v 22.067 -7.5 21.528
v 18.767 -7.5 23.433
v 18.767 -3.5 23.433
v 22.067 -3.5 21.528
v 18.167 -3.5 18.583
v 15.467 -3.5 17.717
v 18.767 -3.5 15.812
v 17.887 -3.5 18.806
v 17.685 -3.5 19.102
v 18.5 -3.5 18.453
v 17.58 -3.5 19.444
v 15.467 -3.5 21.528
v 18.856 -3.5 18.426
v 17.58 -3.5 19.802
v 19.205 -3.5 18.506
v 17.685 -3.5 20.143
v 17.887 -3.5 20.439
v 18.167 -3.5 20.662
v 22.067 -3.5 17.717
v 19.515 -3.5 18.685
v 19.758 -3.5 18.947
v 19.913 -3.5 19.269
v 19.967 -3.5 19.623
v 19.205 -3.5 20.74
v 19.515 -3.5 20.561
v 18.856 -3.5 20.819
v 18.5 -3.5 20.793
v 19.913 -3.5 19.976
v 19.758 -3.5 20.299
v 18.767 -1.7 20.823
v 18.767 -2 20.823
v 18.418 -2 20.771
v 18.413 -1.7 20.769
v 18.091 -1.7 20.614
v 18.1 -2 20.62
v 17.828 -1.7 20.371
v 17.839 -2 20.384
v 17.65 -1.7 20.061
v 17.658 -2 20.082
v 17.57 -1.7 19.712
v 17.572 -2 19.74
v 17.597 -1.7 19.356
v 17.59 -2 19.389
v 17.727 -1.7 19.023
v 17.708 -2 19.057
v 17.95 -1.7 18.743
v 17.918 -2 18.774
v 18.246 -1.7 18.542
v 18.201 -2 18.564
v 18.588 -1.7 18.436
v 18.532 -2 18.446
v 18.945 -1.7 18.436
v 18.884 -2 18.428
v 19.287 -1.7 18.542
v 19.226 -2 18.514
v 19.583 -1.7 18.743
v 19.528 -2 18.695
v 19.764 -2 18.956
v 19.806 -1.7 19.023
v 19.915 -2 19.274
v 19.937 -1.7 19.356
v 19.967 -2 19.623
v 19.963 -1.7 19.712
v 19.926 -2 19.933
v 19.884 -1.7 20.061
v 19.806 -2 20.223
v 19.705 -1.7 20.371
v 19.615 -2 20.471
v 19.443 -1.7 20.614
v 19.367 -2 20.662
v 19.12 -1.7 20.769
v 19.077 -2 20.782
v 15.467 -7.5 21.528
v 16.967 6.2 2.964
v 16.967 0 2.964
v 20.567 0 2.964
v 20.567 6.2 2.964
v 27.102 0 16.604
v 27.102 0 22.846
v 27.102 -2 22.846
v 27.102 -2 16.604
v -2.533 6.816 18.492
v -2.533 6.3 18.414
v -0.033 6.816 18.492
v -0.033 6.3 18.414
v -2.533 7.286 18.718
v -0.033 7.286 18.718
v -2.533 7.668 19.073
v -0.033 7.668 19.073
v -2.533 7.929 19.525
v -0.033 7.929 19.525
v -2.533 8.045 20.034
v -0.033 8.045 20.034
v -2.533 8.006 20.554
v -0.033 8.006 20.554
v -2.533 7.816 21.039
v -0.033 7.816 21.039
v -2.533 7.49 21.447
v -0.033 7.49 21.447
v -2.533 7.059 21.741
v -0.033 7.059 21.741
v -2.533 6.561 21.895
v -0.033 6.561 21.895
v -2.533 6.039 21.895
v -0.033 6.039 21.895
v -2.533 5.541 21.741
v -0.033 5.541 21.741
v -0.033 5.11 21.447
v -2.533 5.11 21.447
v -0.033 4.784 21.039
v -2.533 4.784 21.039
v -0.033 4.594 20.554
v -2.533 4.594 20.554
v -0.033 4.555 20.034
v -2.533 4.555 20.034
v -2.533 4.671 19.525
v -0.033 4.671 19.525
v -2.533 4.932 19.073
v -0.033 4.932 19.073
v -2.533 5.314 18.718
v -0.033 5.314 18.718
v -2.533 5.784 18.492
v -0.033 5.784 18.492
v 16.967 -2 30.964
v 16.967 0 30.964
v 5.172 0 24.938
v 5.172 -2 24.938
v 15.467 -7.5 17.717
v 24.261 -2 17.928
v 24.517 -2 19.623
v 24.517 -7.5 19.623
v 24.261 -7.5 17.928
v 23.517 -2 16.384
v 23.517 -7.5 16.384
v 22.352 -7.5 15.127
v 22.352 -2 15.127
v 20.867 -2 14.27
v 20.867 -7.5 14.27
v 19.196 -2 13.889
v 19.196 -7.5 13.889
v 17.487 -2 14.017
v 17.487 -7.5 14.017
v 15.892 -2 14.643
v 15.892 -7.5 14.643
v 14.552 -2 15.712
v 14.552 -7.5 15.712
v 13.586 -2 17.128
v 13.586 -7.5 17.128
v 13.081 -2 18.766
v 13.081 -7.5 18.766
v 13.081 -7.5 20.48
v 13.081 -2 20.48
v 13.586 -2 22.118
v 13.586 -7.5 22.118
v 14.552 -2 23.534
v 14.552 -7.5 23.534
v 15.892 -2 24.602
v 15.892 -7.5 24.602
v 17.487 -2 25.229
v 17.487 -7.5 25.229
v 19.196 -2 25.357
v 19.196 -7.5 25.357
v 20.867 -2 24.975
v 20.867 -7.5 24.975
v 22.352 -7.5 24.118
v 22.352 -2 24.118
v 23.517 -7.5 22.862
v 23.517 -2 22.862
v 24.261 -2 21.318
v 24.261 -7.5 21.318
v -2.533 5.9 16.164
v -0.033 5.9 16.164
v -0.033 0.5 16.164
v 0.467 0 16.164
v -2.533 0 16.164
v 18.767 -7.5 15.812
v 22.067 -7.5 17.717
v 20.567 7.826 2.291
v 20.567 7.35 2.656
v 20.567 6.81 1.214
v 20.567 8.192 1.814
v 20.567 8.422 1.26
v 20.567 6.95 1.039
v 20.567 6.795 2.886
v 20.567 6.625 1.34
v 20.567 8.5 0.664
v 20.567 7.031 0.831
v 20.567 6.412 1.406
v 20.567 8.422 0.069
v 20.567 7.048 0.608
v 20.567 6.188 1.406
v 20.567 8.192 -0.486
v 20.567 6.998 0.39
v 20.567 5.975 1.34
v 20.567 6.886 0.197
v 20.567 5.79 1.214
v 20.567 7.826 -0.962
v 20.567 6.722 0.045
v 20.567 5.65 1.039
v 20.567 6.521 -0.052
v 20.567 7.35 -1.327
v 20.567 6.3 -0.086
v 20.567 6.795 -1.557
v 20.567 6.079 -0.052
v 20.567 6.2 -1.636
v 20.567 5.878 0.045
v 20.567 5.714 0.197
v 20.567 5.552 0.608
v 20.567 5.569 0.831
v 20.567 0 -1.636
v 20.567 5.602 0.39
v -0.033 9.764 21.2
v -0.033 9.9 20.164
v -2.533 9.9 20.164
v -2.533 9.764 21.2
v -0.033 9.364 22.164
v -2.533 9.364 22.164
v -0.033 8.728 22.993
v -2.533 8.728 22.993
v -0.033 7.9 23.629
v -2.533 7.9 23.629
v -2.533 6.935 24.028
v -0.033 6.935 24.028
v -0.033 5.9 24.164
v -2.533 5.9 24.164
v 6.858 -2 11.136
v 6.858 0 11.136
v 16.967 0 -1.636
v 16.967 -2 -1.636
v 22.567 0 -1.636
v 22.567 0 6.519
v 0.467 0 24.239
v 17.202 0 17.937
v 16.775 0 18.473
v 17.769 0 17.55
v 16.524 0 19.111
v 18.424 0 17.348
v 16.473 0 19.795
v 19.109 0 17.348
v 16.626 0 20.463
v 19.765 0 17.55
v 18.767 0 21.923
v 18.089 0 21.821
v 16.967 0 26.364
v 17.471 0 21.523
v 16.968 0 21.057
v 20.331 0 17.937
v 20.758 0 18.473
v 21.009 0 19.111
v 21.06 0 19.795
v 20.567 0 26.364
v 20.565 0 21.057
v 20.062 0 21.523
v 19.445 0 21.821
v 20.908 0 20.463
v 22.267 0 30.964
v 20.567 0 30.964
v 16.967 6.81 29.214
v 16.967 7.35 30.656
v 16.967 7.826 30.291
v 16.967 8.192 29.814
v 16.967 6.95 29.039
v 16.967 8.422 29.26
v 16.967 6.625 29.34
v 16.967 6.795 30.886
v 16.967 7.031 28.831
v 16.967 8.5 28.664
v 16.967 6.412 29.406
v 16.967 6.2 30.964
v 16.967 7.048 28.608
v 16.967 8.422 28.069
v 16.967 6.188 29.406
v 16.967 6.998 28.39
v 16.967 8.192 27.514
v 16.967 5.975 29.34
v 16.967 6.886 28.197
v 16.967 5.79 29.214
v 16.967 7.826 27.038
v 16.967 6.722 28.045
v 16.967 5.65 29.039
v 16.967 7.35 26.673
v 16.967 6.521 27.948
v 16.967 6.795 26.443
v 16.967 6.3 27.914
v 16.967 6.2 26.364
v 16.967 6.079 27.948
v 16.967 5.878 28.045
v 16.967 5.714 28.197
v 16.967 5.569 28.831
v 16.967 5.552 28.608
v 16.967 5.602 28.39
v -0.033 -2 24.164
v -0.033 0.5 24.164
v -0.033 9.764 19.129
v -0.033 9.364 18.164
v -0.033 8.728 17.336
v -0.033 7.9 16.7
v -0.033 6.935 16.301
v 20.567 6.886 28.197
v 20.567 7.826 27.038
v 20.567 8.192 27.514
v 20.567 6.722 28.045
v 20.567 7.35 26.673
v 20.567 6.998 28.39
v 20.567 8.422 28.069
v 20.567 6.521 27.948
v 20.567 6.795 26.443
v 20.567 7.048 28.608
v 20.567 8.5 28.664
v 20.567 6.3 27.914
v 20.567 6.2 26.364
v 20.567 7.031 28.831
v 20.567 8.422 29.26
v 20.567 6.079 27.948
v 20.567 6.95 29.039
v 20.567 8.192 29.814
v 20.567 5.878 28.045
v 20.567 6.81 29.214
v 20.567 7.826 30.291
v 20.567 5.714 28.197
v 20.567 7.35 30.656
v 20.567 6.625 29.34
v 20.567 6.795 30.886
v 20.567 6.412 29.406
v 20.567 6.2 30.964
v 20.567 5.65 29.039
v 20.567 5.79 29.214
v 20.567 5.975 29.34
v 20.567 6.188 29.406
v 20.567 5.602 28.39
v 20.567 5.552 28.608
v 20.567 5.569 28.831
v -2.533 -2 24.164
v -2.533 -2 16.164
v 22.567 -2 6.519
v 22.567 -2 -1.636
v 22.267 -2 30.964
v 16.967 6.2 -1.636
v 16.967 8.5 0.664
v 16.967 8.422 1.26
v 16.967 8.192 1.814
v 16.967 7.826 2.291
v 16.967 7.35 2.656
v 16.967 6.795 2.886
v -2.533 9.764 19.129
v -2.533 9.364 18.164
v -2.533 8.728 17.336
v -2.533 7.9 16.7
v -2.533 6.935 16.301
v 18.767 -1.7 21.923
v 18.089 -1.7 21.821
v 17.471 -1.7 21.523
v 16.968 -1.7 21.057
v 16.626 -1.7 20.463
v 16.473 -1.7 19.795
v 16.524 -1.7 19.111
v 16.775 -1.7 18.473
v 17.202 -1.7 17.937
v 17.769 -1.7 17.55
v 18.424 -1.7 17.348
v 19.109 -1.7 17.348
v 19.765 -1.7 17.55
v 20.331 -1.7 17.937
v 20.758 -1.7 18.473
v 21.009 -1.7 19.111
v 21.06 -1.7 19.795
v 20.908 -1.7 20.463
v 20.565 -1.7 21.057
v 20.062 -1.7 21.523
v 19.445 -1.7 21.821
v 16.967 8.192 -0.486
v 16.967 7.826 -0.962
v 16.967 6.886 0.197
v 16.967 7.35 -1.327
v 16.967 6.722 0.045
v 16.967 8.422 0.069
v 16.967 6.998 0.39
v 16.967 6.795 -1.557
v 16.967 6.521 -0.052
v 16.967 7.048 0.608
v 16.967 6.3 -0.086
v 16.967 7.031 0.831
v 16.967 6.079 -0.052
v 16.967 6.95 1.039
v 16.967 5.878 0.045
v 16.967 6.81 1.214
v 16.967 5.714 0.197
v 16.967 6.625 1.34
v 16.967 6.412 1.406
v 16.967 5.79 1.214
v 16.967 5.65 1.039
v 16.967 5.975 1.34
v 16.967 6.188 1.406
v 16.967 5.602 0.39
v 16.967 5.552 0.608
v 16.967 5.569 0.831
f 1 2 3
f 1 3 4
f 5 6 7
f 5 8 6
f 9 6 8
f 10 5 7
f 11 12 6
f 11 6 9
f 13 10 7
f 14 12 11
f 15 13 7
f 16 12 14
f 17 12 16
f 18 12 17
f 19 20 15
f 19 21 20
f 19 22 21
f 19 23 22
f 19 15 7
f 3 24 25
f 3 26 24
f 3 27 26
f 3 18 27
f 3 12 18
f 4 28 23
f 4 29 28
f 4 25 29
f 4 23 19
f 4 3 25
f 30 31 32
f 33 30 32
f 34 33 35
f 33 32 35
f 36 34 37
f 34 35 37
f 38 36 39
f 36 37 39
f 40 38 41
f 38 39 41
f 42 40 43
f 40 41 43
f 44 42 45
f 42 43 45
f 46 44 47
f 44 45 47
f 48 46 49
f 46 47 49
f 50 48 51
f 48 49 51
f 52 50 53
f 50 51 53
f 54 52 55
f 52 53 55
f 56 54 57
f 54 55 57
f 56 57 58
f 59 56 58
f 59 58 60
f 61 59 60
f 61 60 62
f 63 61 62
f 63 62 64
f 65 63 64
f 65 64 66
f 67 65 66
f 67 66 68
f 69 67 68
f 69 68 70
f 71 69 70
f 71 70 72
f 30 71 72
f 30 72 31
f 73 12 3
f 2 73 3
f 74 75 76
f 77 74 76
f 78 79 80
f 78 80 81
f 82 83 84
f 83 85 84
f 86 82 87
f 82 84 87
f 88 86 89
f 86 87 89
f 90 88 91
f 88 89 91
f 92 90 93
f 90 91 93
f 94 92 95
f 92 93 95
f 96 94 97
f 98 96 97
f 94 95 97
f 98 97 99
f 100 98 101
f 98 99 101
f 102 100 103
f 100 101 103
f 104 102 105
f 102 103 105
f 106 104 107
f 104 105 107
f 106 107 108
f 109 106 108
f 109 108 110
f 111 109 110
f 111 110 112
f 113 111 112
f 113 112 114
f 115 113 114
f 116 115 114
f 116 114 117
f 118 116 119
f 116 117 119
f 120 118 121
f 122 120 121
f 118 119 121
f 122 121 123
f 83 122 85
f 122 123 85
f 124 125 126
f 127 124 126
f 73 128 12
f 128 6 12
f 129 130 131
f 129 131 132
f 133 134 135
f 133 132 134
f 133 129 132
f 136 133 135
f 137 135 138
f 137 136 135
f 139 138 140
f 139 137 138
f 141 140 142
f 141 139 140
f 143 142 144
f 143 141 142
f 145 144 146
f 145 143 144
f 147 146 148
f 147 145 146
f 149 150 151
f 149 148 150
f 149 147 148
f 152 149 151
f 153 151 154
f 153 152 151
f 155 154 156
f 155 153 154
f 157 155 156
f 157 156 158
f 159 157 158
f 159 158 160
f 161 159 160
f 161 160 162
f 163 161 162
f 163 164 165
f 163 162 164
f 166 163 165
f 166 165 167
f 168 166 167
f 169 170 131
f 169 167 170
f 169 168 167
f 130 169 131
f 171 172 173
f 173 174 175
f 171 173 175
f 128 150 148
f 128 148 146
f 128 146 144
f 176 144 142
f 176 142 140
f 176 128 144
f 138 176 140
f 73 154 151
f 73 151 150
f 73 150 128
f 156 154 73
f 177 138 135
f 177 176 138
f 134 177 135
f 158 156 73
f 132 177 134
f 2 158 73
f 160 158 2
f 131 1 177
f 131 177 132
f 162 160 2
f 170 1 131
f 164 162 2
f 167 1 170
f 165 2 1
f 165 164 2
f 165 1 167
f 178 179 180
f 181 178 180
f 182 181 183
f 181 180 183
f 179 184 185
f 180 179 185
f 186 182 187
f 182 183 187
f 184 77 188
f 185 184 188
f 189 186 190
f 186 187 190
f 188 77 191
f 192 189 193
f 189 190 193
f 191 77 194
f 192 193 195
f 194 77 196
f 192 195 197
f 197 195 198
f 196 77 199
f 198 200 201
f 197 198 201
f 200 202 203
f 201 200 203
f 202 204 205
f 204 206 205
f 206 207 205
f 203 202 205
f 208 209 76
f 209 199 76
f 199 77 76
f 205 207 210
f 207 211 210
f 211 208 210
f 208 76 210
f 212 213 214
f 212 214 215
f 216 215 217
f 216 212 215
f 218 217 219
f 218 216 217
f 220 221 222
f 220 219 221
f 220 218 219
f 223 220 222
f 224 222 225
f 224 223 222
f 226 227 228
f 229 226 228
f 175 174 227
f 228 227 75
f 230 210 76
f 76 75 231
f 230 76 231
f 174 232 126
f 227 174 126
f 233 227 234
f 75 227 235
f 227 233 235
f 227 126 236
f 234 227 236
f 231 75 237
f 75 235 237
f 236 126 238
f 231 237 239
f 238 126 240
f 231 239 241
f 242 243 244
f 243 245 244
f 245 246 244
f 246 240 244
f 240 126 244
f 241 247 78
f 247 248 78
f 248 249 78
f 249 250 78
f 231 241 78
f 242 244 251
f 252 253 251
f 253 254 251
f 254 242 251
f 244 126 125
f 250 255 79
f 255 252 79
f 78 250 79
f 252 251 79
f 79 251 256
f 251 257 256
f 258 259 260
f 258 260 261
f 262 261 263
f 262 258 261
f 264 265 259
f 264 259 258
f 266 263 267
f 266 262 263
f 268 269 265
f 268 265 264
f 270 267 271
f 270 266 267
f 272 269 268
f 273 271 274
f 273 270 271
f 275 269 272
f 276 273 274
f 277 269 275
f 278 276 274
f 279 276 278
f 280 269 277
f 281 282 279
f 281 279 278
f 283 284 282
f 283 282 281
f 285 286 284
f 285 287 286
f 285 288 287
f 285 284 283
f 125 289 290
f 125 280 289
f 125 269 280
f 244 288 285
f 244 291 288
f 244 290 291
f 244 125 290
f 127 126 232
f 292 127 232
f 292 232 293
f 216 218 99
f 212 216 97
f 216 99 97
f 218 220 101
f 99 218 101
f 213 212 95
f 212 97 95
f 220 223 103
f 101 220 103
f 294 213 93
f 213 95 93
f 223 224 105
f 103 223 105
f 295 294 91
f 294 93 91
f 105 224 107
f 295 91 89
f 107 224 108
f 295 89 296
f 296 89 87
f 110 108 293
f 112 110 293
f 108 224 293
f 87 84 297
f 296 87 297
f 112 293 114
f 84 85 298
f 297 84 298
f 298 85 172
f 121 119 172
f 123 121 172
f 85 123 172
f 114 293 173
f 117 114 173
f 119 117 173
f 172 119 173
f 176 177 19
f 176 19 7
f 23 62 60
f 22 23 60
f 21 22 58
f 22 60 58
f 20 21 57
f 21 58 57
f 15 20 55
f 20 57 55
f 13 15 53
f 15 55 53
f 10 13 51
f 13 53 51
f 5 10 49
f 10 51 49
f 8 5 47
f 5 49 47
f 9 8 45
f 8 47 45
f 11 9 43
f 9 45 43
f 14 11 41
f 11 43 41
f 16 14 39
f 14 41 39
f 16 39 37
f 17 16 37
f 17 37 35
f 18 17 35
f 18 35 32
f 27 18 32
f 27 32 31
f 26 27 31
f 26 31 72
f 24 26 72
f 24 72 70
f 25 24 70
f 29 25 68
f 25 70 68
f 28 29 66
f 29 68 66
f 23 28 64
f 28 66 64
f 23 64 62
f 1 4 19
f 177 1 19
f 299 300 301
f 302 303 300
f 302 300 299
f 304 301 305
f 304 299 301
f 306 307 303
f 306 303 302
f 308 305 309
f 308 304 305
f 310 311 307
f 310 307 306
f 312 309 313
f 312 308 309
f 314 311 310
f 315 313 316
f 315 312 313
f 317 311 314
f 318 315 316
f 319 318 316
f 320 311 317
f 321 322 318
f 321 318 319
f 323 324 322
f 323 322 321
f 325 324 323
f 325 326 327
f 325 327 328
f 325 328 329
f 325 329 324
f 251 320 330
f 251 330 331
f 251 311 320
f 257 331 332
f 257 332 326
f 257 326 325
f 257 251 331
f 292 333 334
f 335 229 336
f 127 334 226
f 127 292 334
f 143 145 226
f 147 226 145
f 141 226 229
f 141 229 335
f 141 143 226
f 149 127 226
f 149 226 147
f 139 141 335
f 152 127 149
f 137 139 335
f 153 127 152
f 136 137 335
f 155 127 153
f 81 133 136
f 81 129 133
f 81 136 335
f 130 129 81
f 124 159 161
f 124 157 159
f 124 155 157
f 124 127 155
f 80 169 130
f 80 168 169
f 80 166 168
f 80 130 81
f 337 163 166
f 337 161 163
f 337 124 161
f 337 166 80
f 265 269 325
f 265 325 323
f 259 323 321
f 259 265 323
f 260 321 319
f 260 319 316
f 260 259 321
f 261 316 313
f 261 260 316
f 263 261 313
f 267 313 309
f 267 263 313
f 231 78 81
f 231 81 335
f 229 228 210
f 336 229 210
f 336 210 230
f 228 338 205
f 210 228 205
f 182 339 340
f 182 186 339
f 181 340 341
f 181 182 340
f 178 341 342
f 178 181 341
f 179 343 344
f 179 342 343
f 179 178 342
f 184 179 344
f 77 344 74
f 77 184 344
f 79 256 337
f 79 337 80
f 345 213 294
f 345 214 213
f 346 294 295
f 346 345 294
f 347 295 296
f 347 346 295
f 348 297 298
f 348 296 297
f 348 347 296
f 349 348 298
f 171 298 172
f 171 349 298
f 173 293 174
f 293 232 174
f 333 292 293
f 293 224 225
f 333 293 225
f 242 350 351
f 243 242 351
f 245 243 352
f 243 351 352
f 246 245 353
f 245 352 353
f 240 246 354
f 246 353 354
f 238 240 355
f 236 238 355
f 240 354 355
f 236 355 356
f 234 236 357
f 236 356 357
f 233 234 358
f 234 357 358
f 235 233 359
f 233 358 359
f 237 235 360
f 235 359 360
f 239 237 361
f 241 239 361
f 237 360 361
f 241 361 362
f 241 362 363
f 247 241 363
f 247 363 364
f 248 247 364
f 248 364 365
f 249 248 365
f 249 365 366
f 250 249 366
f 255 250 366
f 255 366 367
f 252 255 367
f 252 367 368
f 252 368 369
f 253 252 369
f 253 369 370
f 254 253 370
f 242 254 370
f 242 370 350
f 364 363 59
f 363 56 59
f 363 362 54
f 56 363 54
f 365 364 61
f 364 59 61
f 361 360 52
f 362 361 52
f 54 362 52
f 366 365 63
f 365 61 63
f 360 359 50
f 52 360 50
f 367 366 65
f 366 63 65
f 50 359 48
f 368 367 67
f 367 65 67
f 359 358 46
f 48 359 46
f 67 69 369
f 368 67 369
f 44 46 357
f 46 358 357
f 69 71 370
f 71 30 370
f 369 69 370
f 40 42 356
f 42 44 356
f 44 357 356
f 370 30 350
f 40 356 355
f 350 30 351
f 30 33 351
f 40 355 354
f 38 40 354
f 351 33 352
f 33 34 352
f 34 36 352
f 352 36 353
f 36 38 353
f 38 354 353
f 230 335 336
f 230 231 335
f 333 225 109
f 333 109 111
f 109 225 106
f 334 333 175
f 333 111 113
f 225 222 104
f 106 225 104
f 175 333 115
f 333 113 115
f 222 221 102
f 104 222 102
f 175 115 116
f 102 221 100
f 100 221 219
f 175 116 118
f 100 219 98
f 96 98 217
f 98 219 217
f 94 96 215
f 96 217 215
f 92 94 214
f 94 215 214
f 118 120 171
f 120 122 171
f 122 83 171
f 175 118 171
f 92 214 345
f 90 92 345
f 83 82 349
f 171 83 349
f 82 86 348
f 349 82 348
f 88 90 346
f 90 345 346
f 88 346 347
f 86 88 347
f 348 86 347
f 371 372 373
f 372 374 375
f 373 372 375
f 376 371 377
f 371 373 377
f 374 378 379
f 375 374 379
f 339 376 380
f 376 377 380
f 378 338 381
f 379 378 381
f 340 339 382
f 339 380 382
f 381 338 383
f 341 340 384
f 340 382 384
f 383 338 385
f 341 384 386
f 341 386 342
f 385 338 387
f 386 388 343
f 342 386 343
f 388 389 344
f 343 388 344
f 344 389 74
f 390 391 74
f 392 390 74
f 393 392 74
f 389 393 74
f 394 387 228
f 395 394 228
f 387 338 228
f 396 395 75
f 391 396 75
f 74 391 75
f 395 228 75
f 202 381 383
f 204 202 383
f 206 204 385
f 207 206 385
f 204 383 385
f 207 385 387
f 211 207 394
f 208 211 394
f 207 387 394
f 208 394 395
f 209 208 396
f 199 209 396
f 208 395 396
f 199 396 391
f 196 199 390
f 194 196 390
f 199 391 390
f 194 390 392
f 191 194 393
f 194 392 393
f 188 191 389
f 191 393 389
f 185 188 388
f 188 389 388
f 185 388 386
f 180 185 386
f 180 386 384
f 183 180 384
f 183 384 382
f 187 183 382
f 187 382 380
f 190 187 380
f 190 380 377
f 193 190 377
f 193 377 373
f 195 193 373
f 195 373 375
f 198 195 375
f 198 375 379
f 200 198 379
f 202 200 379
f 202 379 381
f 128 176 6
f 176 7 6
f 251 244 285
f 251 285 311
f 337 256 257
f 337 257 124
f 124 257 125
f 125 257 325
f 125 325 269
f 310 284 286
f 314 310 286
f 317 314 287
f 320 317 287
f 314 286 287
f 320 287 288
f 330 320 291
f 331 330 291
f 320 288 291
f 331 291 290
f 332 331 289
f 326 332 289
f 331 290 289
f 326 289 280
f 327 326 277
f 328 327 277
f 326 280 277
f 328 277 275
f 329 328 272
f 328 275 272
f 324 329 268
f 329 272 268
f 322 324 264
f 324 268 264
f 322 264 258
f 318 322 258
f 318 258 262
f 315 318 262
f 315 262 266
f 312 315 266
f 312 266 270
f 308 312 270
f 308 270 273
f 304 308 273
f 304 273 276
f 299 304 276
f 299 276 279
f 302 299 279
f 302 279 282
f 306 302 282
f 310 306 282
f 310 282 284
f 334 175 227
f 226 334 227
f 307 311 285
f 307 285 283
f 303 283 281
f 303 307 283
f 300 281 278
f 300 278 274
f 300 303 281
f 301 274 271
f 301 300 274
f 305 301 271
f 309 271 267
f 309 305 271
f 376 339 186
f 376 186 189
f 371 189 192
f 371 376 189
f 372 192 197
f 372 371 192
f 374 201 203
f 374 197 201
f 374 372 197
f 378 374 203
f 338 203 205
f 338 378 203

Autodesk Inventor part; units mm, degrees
ref_plane "YZ Plane" through (0, 0, 0) normal (1, 0, 0) x (0, 1, 0)
ref_plane "XZ Plane" through (0, 0, 0) normal (0, 1, 0) x (-1, 0, 0)
ref_plane "XY Plane" through (0, 0, 0) normal (0, 0, 1) x (1, 0, 0)
sketch "Sketch2" plane through (0, 0, 0) normal (0, 1, 0) x (-1, 0, 0)
  line L0 (2.5334, 16.1644) -> (0.0334, 16.1644)
  line L1 (0.0334, 16.1644) -> (0.0334, 24.1644)
  line L2 (0.0334, 24.1644) -> (2.5334, 24.1644)
  line L3 (2.5334, 24.1644) -> (2.5334, 16.1644)
  line L4 (-20.5666, -1.6356) -> (-16.9666, -1.6356)
  line L5 (-16.9666, -1.6356) -> (-16.9666, 2.9644)
  line L6 (-16.9666, 2.9644) -> (-20.5666, 2.9644)
  line L7 (-20.5666, 2.9644) -> (-20.5666, -1.6356)
  line L8 (-20.5666, 30.9644) -> (-16.9666, 30.9644)
  line L9 (-16.9666, 30.9644) -> (-16.9666, 26.3644)
  line L10 (-16.9666, 26.3644) -> (-20.5666, 26.3644)
  line L11 (-20.5666, 26.3644) -> (-20.5666, 30.9644)
  point P0 (0, 0)
  point P1 (-20.5666, 0.6644)
  point P2 (-20.5666, 28.6644)
  point P3 (0.0334, 20.1644)
  dimension "d4" = 4.6
  dimension "d5" = 3.6
  dimension "d6" = 2.5
  dimension "d7" = 8
  dimension "d8" = 28
  dimension "d9" = 8.5
  dimension "d59" = 20.6
extrude "Extrusion2" add sketch "Sketch2" along normal blind 8.5
sketch "Sketch3" plane through (0, 8.5, 0) normal (0, 1, 0) x (1, 0, 0)
  line L0 (-2.5334, -24.1644) -> (-0.0334, -24.1644)
  line L1 (-0.0334, -24.1644) -> (-0.0334, -16.1644)
  line L2 (-0.0334, -16.1644) -> (-2.5334, -16.1644)
  line L3 (-2.5334, -16.1644) -> (-2.5334, -24.1644)
  point P0 (0, 0)
extrude "Extrusion3" add sketch "Sketch3" along normal blind 1.4
fillet "Fillet1" radius 2.3 4 edges at (18.7666, 8.5, 30.9644) (18.7666, 8.5, 26.3644) (18.7666, 8.5, 2.9644) (18.7666, 8.5, -1.6356)
fillet "Fillet2" radius 4 2 edges at (-1.2834, 9.9, 24.1644) (-1.2834, 9.9, 16.1644)
sketch "Sketch4" plane through (-0.0334, 0, 24.1644) normal (1, 0, 0) x (0, 0, -1)
  line L0 (8, 0) -> (0, 0) projected
  line L1 (4, 0) -> (4, 9.2517) construction
  line L2 (-6.8, 0) -> (-2.2, 0) construction
  line L3 (25.8, 0) -> (21.2, 0) construction
  line L4 (-4.5, 0) -> (-4.5, 8.5) construction
  arc A0 (-2.2, 6.2) -> (-6.8, 6.2) centre (-4.5, 6.2) ccw construction
  line L5 (23.5, 0) -> (23.5, 8.5) construction
  circle A1 centre (4, 6.3) radius 1.75
  circle A2 centre (23.5, 6.3) radius 0.75
  circle A3 centre (-4.5, 6.3) radius 0.75
  point P0 (24.1644, 0)
  dimension "d17" = 3.5
  dimension "d19" = 1.5
  dimension "d20" = 1.5
  dimension "d21" = 6.3
  dimension "d22" = 6.3
  dimension "d23" = 6.3
extrude "Extrusion4" cut sketch "Sketch4" along normal through all both and the other way through all
sketch "Sketch5" plane through (0, 0, 0) normal (0, -1, 0) x (1, 0, 0)
  line L0 (-2.5334, 16.1644) -> (6.8584, 11.1365)
  line L1 (6.8584, 11.1365) -> (16.9666, -1.6356)
  line L2 (16.9666, -1.6356) -> (20.5666, -1.6356)
  line L3 (20.5666, -1.6356) -> (16.9666, -1.6356) projected
  line L4 (20.5666, -1.6356) -> (22.5666, -1.6356)
  line L5 (22.2666, 30.9644) -> (20.5666, 30.9644)
  line L6 (20.5666, 30.9644) -> (16.9666, 30.9644)
  line L7 (16.9666, 30.9644) -> (5.172, 24.9376)
  line L8 (5.172, 24.9376) -> (-0.0334, 24.1644)
  line L9 (-0.0334, 24.1644) -> (-2.5334, 24.1644)
  line L10 (-0.0334, 24.1644) -> (-2.5334, 24.1644) projected
  line L11 (-2.5334, 24.1644) -> (-2.5334, 16.1644)
  line L12 (22.2666, 30.9644) -> (27.1025, 22.846)
  line L13 (27.1025, 22.846) -> (27.1025, 16.6045)
  line L14 (27.1025, 16.6045) -> (22.5666, 6.5187)
  line L15 (22.5666, 6.5187) -> (22.5666, -1.6356)
  point P0 (0, 0)
  dimension "d26" = 2
extrude "Extrusion5" add sketch "Sketch5" along normal blind 2
sketch "Sketch7" plane through (0, -2, 0) normal (0, -1, 0) x (1, 0, 0)
  line L0 (16.9666, 2.9644) -> (20.5666, 2.9644) projected
  line L1 (18.7666, 2.9644) -> (18.7666, 26.3644) construction
  line L2 (20.5666, 26.3644) -> (16.9666, 26.3644) projected
  line L3 (18.7666, 15.8122) -> (15.4666, 17.7174)
  line L4 (15.4666, 17.7174) -> (15.4666, 21.5279)
  line L5 (15.4666, 21.5279) -> (18.7666, 23.4332)
  line L6 (18.7666, 23.4332) -> (22.0666, 21.5279)
  line L7 (22.0666, 21.5279) -> (22.0666, 17.7174)
  line L8 (22.0666, 17.7174) -> (18.7666, 15.8122)
  line L9 (20.5666, 29.4144) -> (20.5666, 27.9144) construction
  line L10 (20.5666, 29.5605) -> (16.9666, 27.9144) construction
  line L11 (16.9666, 27.9144) -> (16.9666, 29.4144) construction
  line L12 (20.5666, 26.7294) -> (15.111, 29.4144) construction
  line L13 (16.9666, 29.4144) -> (20.5666, 29.4144) construction
  circle A0 centre (18.7666, 19.6227) radius 5.75
  point P0 (0, 0)
  point P1 (17.8388, 28.0719)
  dimension "d29" = 8.5
  dimension "d30" = 6.6
  dimension "d31" = 11.5
extrude "Extrusion6" add sketch "Sketch7" along normal blind 5.5
chamfer "Chamfer1" distance 0.5 angle 45 1 edges at (-0.0334, 0, 20.1644)
hole "Hole1" at (18.7666, 0, 19.6227) direction (0, -1, 0) diameter 2.4 end through all
hole "Hole2" at (18.7666, 0, 19.6227) direction (0, -1, 0) diameter 4.6 depth 1.7
sketch "Sketch8" plane through (0, -2, 0) normal (0, -1, 0) x (1, 0, 0)
  line L0 (18.7666, 23.4332) -> (22.0666, 21.5279)
  line L1 (22.0666, 21.5279) -> (22.0666, 17.7174)
  line L2 (22.0666, 17.7174) -> (18.7666, 15.8122)
  line L3 (18.7666, 15.8122) -> (15.4666, 17.7174)
  line L4 (15.4666, 17.7174) -> (15.4666, 21.5279)
  line L5 (15.4666, 21.5279) -> (18.7666, 23.4332)
  circle A0 centre (18.7666, 19.6227) radius 1.2
  point P0 (0, 0)
extrude "Extrusion7" add sketch "Sketch8" along normal blind 1.5
properties part number "servo_gimbal_interpart_1" material "ABS Plastic"
